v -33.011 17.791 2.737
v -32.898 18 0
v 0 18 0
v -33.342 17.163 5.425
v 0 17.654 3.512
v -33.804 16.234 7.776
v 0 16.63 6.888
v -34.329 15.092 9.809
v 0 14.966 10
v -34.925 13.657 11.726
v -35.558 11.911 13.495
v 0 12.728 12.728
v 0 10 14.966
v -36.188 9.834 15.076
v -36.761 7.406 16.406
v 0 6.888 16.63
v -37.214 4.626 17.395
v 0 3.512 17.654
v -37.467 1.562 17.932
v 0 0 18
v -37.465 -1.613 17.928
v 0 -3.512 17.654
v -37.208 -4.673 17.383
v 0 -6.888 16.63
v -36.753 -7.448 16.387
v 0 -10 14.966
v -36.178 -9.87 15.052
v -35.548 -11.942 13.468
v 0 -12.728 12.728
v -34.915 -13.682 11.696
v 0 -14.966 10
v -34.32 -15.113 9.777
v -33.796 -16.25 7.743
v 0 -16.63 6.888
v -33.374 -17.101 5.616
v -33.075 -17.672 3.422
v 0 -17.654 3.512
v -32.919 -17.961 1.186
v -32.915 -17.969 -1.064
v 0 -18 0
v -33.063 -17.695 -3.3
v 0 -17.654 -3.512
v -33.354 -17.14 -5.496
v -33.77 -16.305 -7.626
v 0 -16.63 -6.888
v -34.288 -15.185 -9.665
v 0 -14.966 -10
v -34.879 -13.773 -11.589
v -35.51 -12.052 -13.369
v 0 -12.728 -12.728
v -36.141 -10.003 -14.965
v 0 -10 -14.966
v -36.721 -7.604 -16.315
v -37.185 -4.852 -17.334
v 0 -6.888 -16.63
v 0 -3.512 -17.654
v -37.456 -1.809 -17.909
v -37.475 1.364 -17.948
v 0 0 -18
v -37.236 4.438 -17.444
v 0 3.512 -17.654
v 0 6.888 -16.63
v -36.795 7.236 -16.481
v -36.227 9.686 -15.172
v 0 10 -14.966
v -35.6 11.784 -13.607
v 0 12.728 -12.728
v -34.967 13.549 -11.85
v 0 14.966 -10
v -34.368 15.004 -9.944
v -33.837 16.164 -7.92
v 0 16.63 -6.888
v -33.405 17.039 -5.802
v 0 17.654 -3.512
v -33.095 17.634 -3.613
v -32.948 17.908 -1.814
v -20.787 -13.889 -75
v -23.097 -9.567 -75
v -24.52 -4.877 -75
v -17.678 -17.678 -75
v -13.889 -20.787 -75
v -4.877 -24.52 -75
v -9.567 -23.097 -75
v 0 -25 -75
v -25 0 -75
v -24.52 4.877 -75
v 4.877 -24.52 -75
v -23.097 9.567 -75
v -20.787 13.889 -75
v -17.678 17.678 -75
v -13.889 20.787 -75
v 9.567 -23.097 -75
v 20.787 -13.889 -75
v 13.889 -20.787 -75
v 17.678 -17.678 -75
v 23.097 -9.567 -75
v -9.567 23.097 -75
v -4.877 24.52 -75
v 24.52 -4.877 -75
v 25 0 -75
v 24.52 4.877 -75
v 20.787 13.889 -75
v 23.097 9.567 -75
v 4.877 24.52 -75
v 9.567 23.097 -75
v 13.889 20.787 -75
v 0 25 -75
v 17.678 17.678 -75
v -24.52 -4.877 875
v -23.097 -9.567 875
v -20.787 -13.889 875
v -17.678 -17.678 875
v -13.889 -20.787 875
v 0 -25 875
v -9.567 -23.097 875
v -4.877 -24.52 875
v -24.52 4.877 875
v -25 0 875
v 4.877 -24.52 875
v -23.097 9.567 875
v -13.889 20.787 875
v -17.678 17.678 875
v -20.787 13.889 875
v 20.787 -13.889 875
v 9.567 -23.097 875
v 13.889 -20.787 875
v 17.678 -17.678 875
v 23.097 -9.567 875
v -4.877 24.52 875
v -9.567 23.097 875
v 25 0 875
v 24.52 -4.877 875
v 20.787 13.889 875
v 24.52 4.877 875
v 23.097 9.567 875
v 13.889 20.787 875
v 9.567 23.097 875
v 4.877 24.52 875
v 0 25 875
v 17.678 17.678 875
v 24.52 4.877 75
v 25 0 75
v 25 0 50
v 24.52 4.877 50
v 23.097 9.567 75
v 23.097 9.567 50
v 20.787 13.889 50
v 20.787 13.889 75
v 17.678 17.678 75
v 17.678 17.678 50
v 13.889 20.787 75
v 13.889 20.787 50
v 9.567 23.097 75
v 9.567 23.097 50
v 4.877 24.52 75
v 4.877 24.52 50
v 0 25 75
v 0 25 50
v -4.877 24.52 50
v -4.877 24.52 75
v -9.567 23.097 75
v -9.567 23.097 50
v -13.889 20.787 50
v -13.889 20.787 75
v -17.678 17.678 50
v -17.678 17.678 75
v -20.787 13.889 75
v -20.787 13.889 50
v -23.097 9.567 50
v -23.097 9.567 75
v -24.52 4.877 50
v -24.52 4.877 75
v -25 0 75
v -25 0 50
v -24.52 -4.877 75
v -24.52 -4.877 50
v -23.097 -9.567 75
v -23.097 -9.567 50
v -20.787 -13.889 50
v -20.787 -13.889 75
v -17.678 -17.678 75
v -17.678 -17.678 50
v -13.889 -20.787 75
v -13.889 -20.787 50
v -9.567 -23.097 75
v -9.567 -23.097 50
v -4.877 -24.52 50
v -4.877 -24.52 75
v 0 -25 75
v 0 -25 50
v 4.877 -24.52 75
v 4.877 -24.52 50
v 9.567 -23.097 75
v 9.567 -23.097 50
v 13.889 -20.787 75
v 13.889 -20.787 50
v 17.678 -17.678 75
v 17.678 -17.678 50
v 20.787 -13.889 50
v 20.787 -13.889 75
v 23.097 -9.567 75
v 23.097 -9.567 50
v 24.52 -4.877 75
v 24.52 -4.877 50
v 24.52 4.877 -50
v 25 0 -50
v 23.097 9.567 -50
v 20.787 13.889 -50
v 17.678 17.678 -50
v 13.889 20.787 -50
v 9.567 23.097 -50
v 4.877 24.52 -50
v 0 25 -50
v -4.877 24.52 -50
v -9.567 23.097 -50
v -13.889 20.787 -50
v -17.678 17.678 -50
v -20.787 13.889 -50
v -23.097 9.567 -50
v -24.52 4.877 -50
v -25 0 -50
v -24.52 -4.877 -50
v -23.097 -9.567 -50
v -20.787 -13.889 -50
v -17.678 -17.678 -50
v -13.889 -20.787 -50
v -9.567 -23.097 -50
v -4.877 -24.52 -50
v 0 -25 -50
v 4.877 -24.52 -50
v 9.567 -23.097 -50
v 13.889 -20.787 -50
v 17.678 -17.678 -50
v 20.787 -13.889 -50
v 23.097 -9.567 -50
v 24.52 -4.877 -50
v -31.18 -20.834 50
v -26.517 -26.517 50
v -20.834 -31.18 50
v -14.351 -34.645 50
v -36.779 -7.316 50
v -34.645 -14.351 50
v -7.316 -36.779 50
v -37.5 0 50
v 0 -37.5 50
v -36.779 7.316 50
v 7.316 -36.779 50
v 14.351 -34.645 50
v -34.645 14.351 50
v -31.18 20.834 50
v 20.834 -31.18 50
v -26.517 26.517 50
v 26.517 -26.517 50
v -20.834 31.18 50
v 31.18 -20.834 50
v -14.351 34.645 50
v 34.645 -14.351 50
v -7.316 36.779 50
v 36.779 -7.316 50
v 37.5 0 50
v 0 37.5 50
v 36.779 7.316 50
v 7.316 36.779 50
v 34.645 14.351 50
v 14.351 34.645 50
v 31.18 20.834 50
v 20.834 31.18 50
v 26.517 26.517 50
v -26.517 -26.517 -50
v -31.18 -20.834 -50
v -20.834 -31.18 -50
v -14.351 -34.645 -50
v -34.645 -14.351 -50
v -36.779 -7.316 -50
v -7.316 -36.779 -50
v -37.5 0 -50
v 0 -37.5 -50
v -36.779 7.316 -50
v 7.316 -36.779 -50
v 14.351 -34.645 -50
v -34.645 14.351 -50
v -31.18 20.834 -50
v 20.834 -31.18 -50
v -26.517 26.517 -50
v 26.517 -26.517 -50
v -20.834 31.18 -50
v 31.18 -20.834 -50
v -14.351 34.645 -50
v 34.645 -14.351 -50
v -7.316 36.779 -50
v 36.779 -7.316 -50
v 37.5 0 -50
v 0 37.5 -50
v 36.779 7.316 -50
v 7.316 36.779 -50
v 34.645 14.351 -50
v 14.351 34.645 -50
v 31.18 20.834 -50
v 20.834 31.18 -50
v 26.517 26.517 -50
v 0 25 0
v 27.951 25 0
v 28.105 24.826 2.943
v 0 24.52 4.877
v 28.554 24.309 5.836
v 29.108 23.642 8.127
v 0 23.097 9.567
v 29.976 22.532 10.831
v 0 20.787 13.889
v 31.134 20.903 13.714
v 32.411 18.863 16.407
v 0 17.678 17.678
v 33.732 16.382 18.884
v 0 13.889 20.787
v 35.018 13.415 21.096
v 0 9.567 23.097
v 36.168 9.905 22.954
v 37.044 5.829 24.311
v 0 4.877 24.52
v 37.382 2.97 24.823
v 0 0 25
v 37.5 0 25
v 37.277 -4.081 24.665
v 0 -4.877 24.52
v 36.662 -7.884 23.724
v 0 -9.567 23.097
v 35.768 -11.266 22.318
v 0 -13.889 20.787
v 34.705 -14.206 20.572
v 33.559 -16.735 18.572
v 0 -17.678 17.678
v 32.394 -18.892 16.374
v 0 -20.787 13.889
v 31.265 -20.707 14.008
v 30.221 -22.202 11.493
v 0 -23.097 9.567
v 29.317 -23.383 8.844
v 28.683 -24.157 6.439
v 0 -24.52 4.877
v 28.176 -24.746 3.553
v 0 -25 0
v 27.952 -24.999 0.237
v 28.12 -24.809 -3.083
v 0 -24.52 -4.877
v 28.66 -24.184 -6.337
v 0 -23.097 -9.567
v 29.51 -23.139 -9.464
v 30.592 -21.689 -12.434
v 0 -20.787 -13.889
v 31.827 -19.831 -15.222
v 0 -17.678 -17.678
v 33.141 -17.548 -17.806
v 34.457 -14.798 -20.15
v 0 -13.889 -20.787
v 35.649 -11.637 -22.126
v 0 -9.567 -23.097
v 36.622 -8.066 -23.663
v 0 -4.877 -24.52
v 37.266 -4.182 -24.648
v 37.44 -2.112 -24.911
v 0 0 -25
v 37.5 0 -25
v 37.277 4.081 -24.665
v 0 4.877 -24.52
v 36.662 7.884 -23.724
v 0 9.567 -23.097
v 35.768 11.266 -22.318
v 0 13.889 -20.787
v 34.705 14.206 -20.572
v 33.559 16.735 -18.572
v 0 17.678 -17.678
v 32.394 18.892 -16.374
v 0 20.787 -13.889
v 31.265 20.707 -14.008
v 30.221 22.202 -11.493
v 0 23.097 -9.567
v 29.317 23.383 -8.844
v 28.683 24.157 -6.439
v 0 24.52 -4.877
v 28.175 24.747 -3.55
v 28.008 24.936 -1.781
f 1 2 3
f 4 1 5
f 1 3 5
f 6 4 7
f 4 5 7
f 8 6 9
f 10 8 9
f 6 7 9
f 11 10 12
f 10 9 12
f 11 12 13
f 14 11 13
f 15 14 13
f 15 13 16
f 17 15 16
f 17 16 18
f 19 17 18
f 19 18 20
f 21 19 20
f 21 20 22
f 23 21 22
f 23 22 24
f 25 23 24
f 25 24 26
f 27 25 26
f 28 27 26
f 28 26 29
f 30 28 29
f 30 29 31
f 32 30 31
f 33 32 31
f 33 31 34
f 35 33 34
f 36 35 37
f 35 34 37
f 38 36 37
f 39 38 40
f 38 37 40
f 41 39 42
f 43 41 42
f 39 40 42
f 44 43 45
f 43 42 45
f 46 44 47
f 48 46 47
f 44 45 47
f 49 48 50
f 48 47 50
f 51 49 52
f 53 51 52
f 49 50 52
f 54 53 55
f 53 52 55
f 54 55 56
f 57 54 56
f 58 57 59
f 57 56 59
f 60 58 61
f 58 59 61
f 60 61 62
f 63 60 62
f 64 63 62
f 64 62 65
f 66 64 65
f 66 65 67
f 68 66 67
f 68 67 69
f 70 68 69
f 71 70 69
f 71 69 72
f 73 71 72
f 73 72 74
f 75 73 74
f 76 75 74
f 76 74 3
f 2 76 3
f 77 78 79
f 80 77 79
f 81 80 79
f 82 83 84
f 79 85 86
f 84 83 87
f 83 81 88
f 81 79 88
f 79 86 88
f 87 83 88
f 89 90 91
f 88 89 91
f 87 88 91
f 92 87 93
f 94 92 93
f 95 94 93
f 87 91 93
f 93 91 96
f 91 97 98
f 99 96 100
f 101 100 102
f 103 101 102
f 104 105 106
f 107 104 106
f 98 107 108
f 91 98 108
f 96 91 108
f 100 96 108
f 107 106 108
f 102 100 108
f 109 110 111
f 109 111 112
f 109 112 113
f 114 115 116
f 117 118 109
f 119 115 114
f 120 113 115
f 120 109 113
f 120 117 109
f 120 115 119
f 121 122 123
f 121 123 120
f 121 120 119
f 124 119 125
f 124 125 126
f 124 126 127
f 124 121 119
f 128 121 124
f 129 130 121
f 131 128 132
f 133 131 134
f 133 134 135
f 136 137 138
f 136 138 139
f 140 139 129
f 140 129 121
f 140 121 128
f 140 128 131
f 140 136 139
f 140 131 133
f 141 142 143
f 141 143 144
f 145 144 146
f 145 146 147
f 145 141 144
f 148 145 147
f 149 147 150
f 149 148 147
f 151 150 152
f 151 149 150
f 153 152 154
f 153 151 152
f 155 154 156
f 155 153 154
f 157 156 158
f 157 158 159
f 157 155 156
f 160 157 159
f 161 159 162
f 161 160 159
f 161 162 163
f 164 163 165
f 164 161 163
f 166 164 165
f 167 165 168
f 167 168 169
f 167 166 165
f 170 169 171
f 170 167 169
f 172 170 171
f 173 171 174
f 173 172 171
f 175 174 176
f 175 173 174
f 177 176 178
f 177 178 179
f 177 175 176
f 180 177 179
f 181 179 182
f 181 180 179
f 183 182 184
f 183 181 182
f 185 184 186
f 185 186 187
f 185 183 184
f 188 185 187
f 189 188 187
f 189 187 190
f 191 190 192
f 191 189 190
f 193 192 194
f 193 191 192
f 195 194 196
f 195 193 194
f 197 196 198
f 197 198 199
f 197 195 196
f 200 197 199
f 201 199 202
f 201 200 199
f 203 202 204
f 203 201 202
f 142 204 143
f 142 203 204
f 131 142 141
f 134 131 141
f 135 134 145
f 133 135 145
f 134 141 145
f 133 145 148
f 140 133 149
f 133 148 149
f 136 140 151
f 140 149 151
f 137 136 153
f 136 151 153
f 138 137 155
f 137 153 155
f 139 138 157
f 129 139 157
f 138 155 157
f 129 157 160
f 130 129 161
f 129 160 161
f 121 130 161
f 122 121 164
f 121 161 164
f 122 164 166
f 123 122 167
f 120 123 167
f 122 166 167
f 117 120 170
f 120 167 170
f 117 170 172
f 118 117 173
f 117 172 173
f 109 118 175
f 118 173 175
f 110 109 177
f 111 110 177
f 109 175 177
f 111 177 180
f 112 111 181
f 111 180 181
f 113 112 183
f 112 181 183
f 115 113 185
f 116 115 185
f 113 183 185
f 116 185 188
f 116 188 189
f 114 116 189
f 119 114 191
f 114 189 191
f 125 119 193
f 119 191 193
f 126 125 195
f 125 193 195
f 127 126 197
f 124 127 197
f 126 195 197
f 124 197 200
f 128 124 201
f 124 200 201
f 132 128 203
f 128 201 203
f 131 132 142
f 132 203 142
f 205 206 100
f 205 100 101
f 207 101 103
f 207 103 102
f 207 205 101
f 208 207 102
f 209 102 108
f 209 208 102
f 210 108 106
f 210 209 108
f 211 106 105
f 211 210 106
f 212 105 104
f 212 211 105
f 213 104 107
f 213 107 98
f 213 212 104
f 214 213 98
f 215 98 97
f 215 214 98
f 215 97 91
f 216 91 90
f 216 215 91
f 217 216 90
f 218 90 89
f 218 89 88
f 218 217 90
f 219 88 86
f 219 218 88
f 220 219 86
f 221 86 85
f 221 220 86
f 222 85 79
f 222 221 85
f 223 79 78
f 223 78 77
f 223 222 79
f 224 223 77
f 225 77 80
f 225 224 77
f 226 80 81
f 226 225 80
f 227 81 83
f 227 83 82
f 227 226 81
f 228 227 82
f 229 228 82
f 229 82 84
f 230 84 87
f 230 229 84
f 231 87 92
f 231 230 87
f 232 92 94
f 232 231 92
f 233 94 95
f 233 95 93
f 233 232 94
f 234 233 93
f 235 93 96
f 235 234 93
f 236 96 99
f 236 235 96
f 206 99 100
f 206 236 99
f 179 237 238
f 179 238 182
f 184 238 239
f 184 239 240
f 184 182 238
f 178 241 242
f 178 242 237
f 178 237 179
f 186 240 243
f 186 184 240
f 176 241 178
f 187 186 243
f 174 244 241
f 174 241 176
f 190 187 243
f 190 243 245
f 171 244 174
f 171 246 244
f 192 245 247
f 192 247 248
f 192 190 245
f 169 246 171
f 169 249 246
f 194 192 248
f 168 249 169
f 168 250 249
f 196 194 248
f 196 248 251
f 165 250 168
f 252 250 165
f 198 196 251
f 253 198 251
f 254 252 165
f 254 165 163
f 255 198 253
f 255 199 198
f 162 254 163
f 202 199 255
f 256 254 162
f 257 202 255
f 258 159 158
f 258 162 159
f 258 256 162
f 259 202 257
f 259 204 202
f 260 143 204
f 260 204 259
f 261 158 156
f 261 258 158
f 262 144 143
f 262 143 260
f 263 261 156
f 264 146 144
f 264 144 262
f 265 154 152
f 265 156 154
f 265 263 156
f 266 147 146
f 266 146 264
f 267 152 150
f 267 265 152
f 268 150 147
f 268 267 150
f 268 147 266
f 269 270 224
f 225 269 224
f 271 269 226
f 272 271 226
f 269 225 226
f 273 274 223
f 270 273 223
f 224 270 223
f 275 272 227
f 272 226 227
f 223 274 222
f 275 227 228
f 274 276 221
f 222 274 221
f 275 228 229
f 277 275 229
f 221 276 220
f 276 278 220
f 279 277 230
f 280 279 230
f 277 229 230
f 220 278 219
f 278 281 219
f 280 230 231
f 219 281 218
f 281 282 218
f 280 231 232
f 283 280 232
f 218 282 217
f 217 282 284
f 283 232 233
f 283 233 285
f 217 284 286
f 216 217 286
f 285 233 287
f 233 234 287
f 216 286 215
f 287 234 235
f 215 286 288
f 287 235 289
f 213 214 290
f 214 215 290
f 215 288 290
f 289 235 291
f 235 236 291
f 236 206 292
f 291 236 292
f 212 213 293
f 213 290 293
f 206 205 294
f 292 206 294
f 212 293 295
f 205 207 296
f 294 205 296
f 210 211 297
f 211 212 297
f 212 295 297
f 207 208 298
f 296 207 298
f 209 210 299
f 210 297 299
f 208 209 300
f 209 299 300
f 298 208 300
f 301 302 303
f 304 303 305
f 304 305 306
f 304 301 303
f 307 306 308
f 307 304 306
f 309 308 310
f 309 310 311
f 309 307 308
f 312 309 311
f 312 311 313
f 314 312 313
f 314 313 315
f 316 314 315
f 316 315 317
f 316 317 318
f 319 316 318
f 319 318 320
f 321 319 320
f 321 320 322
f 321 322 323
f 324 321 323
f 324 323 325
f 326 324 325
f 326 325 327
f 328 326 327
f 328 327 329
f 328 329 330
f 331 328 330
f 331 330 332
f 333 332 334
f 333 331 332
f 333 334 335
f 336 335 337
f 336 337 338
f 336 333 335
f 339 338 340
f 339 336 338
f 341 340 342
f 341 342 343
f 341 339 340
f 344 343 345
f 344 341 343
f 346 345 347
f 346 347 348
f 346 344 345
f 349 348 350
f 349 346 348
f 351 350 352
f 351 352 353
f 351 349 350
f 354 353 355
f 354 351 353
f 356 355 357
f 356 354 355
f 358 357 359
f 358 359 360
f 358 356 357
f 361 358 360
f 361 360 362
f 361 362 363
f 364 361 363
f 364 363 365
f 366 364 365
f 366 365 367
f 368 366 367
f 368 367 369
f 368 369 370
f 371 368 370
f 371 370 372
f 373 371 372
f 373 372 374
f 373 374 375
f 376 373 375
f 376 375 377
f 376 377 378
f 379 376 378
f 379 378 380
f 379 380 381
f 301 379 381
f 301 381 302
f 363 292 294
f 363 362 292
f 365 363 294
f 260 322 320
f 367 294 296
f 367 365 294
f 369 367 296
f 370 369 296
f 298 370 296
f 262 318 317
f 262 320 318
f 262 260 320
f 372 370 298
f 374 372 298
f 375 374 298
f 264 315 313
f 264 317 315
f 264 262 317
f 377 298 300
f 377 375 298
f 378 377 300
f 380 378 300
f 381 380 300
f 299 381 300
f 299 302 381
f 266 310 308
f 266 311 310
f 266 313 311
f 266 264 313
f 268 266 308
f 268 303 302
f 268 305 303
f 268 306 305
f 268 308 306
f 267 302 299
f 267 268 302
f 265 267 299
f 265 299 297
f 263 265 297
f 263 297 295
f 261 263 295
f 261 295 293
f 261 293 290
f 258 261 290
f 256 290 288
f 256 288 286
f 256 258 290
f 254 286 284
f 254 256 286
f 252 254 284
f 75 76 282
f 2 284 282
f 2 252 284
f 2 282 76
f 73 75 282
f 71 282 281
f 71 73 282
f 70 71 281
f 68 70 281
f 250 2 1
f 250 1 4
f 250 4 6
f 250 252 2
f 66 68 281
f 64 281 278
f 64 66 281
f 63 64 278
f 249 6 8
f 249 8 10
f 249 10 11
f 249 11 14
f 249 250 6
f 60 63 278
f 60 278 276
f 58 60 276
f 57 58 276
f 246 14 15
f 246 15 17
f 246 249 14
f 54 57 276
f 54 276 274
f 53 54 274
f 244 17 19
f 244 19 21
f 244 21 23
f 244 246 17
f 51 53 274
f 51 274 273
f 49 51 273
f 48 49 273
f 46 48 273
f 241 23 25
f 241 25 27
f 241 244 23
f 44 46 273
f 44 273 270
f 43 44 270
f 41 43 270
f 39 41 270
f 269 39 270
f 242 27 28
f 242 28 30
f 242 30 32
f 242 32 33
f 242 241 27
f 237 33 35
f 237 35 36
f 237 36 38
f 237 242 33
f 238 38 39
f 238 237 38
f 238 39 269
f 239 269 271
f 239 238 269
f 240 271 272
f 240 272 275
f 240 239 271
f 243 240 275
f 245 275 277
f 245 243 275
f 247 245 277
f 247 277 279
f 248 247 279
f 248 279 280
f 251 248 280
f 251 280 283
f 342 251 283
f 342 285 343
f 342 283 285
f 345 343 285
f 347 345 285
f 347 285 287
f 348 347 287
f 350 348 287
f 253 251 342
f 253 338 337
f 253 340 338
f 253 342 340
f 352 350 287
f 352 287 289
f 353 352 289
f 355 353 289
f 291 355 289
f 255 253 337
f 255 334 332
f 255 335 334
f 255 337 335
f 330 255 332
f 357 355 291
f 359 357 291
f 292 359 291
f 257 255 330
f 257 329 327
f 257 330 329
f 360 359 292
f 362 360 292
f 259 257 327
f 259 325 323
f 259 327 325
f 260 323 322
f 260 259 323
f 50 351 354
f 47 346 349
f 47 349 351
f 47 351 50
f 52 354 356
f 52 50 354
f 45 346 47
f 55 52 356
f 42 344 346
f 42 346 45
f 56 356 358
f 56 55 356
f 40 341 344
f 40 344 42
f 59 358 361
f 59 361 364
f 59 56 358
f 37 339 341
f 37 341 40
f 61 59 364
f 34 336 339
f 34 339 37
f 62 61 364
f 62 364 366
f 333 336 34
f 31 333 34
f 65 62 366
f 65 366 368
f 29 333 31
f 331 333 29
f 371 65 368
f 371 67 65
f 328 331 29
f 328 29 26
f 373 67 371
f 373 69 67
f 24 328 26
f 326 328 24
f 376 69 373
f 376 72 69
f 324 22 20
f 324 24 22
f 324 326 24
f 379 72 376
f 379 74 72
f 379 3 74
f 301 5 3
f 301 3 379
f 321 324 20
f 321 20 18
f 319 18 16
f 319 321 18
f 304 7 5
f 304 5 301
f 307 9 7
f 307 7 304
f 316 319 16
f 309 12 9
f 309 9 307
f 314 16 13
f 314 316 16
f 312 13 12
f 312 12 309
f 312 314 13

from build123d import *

# Parameters (mm, degrees)
F0_R     = 25
F1_DEPTH = 75
F0_R_2   = 37.5
F2_DEPTH = 50
F3_R     = 18
F4_DEPTH = 37.501
F5_R     = 25
F6_DEPTH = 37.5010001
F7_R     = 25
F8_DEPTH = 800


with BuildPart() as f1:
    # F0 (on Top) → F1 (new body, symmetric)
    with BuildSketch(Plane.XY):
        Circle(F0_R)
    extrude(amount=F1_DEPTH, both=True)

    # F0 (on Top) → F2 (join, symmetric)
    with BuildSketch(Plane.XY):
        Circle(F0_R_2)
        Circle(F0_R, mode=Mode.SUBTRACT)
    extrude(amount=F2_DEPTH, both=True)

    # F3 (on Right) → F4 (cut, through all)
    with BuildSketch(Plane.YZ):
        Circle(F3_R)
    extrude(amount=-F4_DEPTH, mode=Mode.SUBTRACT)

    # F5 (on Right) → F6 (cut, through all)
    with BuildSketch(Plane.YZ):
        Circle(F5_R)
    extrude(amount=F6_DEPTH, mode=Mode.SUBTRACT)

    # F7 (on face) → F8 (join)
    with BuildSketch(Plane.XY.offset(75)):
        Circle(F7_R)
    extrude(amount=F8_DEPTH)


solid = f1.part
